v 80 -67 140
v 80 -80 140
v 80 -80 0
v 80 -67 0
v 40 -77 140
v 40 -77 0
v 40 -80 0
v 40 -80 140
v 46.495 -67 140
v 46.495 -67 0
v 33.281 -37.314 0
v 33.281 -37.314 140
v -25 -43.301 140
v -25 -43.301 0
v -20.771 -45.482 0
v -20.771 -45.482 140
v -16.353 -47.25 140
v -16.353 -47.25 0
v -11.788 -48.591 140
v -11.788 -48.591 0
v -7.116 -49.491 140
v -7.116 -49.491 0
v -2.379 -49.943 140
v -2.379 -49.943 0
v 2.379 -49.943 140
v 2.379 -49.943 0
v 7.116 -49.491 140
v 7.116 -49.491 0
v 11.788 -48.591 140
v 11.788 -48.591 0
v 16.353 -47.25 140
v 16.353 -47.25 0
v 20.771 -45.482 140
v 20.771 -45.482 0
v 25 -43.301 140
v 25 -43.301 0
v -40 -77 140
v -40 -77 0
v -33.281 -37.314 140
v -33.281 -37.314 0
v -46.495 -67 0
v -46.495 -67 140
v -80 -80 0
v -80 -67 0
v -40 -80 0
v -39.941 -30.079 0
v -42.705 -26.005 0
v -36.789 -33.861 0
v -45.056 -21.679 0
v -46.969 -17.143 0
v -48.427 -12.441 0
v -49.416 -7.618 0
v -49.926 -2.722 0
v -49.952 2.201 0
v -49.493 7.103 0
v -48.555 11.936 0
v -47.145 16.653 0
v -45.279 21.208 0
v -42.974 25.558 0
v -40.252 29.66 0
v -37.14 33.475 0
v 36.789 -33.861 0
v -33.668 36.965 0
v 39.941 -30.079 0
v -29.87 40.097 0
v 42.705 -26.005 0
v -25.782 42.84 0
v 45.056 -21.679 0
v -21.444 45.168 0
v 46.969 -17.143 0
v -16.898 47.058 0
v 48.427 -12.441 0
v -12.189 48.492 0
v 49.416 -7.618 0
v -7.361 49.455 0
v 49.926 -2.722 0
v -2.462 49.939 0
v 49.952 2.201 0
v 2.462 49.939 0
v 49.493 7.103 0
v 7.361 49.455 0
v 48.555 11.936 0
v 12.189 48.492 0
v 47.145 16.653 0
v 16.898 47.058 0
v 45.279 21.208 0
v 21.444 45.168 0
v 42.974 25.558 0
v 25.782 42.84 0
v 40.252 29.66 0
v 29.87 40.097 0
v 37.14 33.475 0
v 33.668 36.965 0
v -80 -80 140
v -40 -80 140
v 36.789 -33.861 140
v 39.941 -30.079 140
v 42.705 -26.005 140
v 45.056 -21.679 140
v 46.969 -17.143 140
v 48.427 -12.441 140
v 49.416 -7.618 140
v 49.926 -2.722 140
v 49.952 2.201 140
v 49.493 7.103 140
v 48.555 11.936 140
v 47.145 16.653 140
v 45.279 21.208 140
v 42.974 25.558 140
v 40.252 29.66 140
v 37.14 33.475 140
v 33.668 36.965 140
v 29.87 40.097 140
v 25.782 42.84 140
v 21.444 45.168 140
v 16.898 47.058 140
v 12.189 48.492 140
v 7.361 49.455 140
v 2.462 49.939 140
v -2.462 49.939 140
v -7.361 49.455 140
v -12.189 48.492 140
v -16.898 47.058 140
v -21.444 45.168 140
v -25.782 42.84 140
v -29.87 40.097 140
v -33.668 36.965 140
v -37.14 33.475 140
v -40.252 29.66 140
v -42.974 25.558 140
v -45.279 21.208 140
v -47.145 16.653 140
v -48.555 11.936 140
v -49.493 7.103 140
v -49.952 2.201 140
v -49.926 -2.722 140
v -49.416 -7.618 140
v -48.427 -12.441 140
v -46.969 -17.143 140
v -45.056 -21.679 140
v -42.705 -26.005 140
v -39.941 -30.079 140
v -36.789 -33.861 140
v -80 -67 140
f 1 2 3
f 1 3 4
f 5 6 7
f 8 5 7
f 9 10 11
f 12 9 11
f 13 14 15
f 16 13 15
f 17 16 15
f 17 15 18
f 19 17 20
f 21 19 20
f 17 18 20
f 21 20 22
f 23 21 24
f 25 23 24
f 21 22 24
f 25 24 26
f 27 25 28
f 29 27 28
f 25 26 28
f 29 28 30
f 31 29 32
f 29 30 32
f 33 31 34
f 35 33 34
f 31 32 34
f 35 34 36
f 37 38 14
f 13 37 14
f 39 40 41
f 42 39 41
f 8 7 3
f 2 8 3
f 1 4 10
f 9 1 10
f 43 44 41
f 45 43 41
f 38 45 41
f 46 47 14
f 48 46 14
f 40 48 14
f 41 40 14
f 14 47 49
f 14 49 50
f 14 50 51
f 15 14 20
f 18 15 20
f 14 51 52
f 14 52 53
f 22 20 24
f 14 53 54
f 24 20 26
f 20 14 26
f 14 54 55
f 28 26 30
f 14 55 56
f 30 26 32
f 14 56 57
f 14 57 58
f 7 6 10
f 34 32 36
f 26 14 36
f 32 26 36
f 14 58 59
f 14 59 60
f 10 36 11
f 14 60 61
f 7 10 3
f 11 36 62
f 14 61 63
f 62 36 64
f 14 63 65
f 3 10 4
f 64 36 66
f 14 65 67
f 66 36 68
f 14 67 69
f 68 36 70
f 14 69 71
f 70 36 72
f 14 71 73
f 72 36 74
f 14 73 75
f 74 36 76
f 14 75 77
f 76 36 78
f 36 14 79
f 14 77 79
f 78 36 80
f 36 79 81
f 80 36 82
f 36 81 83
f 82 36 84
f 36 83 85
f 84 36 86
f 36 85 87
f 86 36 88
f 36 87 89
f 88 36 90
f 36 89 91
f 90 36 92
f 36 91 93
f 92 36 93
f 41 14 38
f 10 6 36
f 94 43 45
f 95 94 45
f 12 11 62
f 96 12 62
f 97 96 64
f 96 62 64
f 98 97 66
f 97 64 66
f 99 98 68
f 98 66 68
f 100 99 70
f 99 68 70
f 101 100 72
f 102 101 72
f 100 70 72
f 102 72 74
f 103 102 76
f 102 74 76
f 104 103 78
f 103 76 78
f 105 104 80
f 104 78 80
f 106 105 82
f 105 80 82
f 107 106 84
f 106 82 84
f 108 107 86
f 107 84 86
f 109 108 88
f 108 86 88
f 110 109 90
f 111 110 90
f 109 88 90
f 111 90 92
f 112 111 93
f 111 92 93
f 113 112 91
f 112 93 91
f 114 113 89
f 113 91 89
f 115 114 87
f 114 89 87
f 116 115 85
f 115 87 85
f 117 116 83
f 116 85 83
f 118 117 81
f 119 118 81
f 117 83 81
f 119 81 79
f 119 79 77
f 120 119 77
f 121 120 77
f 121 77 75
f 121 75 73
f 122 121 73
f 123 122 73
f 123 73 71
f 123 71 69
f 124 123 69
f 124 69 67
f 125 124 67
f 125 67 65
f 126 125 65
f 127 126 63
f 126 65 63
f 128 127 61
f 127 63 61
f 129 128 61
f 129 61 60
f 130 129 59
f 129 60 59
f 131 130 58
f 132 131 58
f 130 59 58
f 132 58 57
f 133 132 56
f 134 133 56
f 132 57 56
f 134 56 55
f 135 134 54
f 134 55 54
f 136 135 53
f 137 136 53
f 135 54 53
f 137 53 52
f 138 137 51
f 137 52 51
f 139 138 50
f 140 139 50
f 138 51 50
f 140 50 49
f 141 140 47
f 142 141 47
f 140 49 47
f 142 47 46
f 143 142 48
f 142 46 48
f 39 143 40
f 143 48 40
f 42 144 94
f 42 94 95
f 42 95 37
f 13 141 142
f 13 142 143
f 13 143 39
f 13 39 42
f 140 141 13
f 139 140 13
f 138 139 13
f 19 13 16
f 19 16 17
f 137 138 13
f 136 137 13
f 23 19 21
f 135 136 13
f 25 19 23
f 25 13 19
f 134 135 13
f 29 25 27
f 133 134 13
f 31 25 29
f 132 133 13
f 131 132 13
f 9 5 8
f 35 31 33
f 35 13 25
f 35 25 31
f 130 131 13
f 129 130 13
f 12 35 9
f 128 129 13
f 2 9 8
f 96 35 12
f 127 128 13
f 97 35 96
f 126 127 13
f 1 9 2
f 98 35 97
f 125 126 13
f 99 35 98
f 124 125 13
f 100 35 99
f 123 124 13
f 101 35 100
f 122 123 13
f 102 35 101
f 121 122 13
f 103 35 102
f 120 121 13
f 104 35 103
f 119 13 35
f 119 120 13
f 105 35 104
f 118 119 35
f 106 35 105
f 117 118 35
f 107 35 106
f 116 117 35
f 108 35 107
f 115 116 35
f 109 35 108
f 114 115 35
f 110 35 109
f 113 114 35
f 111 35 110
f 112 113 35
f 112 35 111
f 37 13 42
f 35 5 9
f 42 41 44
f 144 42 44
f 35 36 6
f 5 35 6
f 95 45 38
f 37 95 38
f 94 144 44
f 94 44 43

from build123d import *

# Parameters (mm, degrees)
EXTRUDE_1_DEPTH = 140


with BuildPart() as part:
    # ｽｹｯﾁ1 → ﾎﾞｽ - 押し出し1 (new body)
    with BuildSketch(Plane.XY):
        with BuildLine():
            Line((-40, -77), (-25, -43.301270189))
            ThreePointArc((-25, -43.301270189), (0, -50), (25, -43.301270189))
            Line((25, -43.301270189), (40, -77))
            Line((40, -77), (40, -80))
            Line((40, -80), (80, -80))
            Line((80, -80), (80, -67))
            Line((80, -67), (46.494717001, -67))
            Line((46.494717001, -67), (33.281076638, -37.314473571))
            ThreePointArc((33.281076638, -37.314473571), (0, 50), (-33.281076638, -37.314473571))
            Line((-33.281076638, -37.314473571), (-46.494717001, -67))
            Line((-46.494717001, -67), (-80, -67))
            Line((-80, -67), (-80, -80))
            Line((-80, -80), (-40, -80))
            Line((-40, -80), (-40, -77))
        make_face()
    extrude(amount=EXTRUDE_1_DEPTH)


solid = part.part
